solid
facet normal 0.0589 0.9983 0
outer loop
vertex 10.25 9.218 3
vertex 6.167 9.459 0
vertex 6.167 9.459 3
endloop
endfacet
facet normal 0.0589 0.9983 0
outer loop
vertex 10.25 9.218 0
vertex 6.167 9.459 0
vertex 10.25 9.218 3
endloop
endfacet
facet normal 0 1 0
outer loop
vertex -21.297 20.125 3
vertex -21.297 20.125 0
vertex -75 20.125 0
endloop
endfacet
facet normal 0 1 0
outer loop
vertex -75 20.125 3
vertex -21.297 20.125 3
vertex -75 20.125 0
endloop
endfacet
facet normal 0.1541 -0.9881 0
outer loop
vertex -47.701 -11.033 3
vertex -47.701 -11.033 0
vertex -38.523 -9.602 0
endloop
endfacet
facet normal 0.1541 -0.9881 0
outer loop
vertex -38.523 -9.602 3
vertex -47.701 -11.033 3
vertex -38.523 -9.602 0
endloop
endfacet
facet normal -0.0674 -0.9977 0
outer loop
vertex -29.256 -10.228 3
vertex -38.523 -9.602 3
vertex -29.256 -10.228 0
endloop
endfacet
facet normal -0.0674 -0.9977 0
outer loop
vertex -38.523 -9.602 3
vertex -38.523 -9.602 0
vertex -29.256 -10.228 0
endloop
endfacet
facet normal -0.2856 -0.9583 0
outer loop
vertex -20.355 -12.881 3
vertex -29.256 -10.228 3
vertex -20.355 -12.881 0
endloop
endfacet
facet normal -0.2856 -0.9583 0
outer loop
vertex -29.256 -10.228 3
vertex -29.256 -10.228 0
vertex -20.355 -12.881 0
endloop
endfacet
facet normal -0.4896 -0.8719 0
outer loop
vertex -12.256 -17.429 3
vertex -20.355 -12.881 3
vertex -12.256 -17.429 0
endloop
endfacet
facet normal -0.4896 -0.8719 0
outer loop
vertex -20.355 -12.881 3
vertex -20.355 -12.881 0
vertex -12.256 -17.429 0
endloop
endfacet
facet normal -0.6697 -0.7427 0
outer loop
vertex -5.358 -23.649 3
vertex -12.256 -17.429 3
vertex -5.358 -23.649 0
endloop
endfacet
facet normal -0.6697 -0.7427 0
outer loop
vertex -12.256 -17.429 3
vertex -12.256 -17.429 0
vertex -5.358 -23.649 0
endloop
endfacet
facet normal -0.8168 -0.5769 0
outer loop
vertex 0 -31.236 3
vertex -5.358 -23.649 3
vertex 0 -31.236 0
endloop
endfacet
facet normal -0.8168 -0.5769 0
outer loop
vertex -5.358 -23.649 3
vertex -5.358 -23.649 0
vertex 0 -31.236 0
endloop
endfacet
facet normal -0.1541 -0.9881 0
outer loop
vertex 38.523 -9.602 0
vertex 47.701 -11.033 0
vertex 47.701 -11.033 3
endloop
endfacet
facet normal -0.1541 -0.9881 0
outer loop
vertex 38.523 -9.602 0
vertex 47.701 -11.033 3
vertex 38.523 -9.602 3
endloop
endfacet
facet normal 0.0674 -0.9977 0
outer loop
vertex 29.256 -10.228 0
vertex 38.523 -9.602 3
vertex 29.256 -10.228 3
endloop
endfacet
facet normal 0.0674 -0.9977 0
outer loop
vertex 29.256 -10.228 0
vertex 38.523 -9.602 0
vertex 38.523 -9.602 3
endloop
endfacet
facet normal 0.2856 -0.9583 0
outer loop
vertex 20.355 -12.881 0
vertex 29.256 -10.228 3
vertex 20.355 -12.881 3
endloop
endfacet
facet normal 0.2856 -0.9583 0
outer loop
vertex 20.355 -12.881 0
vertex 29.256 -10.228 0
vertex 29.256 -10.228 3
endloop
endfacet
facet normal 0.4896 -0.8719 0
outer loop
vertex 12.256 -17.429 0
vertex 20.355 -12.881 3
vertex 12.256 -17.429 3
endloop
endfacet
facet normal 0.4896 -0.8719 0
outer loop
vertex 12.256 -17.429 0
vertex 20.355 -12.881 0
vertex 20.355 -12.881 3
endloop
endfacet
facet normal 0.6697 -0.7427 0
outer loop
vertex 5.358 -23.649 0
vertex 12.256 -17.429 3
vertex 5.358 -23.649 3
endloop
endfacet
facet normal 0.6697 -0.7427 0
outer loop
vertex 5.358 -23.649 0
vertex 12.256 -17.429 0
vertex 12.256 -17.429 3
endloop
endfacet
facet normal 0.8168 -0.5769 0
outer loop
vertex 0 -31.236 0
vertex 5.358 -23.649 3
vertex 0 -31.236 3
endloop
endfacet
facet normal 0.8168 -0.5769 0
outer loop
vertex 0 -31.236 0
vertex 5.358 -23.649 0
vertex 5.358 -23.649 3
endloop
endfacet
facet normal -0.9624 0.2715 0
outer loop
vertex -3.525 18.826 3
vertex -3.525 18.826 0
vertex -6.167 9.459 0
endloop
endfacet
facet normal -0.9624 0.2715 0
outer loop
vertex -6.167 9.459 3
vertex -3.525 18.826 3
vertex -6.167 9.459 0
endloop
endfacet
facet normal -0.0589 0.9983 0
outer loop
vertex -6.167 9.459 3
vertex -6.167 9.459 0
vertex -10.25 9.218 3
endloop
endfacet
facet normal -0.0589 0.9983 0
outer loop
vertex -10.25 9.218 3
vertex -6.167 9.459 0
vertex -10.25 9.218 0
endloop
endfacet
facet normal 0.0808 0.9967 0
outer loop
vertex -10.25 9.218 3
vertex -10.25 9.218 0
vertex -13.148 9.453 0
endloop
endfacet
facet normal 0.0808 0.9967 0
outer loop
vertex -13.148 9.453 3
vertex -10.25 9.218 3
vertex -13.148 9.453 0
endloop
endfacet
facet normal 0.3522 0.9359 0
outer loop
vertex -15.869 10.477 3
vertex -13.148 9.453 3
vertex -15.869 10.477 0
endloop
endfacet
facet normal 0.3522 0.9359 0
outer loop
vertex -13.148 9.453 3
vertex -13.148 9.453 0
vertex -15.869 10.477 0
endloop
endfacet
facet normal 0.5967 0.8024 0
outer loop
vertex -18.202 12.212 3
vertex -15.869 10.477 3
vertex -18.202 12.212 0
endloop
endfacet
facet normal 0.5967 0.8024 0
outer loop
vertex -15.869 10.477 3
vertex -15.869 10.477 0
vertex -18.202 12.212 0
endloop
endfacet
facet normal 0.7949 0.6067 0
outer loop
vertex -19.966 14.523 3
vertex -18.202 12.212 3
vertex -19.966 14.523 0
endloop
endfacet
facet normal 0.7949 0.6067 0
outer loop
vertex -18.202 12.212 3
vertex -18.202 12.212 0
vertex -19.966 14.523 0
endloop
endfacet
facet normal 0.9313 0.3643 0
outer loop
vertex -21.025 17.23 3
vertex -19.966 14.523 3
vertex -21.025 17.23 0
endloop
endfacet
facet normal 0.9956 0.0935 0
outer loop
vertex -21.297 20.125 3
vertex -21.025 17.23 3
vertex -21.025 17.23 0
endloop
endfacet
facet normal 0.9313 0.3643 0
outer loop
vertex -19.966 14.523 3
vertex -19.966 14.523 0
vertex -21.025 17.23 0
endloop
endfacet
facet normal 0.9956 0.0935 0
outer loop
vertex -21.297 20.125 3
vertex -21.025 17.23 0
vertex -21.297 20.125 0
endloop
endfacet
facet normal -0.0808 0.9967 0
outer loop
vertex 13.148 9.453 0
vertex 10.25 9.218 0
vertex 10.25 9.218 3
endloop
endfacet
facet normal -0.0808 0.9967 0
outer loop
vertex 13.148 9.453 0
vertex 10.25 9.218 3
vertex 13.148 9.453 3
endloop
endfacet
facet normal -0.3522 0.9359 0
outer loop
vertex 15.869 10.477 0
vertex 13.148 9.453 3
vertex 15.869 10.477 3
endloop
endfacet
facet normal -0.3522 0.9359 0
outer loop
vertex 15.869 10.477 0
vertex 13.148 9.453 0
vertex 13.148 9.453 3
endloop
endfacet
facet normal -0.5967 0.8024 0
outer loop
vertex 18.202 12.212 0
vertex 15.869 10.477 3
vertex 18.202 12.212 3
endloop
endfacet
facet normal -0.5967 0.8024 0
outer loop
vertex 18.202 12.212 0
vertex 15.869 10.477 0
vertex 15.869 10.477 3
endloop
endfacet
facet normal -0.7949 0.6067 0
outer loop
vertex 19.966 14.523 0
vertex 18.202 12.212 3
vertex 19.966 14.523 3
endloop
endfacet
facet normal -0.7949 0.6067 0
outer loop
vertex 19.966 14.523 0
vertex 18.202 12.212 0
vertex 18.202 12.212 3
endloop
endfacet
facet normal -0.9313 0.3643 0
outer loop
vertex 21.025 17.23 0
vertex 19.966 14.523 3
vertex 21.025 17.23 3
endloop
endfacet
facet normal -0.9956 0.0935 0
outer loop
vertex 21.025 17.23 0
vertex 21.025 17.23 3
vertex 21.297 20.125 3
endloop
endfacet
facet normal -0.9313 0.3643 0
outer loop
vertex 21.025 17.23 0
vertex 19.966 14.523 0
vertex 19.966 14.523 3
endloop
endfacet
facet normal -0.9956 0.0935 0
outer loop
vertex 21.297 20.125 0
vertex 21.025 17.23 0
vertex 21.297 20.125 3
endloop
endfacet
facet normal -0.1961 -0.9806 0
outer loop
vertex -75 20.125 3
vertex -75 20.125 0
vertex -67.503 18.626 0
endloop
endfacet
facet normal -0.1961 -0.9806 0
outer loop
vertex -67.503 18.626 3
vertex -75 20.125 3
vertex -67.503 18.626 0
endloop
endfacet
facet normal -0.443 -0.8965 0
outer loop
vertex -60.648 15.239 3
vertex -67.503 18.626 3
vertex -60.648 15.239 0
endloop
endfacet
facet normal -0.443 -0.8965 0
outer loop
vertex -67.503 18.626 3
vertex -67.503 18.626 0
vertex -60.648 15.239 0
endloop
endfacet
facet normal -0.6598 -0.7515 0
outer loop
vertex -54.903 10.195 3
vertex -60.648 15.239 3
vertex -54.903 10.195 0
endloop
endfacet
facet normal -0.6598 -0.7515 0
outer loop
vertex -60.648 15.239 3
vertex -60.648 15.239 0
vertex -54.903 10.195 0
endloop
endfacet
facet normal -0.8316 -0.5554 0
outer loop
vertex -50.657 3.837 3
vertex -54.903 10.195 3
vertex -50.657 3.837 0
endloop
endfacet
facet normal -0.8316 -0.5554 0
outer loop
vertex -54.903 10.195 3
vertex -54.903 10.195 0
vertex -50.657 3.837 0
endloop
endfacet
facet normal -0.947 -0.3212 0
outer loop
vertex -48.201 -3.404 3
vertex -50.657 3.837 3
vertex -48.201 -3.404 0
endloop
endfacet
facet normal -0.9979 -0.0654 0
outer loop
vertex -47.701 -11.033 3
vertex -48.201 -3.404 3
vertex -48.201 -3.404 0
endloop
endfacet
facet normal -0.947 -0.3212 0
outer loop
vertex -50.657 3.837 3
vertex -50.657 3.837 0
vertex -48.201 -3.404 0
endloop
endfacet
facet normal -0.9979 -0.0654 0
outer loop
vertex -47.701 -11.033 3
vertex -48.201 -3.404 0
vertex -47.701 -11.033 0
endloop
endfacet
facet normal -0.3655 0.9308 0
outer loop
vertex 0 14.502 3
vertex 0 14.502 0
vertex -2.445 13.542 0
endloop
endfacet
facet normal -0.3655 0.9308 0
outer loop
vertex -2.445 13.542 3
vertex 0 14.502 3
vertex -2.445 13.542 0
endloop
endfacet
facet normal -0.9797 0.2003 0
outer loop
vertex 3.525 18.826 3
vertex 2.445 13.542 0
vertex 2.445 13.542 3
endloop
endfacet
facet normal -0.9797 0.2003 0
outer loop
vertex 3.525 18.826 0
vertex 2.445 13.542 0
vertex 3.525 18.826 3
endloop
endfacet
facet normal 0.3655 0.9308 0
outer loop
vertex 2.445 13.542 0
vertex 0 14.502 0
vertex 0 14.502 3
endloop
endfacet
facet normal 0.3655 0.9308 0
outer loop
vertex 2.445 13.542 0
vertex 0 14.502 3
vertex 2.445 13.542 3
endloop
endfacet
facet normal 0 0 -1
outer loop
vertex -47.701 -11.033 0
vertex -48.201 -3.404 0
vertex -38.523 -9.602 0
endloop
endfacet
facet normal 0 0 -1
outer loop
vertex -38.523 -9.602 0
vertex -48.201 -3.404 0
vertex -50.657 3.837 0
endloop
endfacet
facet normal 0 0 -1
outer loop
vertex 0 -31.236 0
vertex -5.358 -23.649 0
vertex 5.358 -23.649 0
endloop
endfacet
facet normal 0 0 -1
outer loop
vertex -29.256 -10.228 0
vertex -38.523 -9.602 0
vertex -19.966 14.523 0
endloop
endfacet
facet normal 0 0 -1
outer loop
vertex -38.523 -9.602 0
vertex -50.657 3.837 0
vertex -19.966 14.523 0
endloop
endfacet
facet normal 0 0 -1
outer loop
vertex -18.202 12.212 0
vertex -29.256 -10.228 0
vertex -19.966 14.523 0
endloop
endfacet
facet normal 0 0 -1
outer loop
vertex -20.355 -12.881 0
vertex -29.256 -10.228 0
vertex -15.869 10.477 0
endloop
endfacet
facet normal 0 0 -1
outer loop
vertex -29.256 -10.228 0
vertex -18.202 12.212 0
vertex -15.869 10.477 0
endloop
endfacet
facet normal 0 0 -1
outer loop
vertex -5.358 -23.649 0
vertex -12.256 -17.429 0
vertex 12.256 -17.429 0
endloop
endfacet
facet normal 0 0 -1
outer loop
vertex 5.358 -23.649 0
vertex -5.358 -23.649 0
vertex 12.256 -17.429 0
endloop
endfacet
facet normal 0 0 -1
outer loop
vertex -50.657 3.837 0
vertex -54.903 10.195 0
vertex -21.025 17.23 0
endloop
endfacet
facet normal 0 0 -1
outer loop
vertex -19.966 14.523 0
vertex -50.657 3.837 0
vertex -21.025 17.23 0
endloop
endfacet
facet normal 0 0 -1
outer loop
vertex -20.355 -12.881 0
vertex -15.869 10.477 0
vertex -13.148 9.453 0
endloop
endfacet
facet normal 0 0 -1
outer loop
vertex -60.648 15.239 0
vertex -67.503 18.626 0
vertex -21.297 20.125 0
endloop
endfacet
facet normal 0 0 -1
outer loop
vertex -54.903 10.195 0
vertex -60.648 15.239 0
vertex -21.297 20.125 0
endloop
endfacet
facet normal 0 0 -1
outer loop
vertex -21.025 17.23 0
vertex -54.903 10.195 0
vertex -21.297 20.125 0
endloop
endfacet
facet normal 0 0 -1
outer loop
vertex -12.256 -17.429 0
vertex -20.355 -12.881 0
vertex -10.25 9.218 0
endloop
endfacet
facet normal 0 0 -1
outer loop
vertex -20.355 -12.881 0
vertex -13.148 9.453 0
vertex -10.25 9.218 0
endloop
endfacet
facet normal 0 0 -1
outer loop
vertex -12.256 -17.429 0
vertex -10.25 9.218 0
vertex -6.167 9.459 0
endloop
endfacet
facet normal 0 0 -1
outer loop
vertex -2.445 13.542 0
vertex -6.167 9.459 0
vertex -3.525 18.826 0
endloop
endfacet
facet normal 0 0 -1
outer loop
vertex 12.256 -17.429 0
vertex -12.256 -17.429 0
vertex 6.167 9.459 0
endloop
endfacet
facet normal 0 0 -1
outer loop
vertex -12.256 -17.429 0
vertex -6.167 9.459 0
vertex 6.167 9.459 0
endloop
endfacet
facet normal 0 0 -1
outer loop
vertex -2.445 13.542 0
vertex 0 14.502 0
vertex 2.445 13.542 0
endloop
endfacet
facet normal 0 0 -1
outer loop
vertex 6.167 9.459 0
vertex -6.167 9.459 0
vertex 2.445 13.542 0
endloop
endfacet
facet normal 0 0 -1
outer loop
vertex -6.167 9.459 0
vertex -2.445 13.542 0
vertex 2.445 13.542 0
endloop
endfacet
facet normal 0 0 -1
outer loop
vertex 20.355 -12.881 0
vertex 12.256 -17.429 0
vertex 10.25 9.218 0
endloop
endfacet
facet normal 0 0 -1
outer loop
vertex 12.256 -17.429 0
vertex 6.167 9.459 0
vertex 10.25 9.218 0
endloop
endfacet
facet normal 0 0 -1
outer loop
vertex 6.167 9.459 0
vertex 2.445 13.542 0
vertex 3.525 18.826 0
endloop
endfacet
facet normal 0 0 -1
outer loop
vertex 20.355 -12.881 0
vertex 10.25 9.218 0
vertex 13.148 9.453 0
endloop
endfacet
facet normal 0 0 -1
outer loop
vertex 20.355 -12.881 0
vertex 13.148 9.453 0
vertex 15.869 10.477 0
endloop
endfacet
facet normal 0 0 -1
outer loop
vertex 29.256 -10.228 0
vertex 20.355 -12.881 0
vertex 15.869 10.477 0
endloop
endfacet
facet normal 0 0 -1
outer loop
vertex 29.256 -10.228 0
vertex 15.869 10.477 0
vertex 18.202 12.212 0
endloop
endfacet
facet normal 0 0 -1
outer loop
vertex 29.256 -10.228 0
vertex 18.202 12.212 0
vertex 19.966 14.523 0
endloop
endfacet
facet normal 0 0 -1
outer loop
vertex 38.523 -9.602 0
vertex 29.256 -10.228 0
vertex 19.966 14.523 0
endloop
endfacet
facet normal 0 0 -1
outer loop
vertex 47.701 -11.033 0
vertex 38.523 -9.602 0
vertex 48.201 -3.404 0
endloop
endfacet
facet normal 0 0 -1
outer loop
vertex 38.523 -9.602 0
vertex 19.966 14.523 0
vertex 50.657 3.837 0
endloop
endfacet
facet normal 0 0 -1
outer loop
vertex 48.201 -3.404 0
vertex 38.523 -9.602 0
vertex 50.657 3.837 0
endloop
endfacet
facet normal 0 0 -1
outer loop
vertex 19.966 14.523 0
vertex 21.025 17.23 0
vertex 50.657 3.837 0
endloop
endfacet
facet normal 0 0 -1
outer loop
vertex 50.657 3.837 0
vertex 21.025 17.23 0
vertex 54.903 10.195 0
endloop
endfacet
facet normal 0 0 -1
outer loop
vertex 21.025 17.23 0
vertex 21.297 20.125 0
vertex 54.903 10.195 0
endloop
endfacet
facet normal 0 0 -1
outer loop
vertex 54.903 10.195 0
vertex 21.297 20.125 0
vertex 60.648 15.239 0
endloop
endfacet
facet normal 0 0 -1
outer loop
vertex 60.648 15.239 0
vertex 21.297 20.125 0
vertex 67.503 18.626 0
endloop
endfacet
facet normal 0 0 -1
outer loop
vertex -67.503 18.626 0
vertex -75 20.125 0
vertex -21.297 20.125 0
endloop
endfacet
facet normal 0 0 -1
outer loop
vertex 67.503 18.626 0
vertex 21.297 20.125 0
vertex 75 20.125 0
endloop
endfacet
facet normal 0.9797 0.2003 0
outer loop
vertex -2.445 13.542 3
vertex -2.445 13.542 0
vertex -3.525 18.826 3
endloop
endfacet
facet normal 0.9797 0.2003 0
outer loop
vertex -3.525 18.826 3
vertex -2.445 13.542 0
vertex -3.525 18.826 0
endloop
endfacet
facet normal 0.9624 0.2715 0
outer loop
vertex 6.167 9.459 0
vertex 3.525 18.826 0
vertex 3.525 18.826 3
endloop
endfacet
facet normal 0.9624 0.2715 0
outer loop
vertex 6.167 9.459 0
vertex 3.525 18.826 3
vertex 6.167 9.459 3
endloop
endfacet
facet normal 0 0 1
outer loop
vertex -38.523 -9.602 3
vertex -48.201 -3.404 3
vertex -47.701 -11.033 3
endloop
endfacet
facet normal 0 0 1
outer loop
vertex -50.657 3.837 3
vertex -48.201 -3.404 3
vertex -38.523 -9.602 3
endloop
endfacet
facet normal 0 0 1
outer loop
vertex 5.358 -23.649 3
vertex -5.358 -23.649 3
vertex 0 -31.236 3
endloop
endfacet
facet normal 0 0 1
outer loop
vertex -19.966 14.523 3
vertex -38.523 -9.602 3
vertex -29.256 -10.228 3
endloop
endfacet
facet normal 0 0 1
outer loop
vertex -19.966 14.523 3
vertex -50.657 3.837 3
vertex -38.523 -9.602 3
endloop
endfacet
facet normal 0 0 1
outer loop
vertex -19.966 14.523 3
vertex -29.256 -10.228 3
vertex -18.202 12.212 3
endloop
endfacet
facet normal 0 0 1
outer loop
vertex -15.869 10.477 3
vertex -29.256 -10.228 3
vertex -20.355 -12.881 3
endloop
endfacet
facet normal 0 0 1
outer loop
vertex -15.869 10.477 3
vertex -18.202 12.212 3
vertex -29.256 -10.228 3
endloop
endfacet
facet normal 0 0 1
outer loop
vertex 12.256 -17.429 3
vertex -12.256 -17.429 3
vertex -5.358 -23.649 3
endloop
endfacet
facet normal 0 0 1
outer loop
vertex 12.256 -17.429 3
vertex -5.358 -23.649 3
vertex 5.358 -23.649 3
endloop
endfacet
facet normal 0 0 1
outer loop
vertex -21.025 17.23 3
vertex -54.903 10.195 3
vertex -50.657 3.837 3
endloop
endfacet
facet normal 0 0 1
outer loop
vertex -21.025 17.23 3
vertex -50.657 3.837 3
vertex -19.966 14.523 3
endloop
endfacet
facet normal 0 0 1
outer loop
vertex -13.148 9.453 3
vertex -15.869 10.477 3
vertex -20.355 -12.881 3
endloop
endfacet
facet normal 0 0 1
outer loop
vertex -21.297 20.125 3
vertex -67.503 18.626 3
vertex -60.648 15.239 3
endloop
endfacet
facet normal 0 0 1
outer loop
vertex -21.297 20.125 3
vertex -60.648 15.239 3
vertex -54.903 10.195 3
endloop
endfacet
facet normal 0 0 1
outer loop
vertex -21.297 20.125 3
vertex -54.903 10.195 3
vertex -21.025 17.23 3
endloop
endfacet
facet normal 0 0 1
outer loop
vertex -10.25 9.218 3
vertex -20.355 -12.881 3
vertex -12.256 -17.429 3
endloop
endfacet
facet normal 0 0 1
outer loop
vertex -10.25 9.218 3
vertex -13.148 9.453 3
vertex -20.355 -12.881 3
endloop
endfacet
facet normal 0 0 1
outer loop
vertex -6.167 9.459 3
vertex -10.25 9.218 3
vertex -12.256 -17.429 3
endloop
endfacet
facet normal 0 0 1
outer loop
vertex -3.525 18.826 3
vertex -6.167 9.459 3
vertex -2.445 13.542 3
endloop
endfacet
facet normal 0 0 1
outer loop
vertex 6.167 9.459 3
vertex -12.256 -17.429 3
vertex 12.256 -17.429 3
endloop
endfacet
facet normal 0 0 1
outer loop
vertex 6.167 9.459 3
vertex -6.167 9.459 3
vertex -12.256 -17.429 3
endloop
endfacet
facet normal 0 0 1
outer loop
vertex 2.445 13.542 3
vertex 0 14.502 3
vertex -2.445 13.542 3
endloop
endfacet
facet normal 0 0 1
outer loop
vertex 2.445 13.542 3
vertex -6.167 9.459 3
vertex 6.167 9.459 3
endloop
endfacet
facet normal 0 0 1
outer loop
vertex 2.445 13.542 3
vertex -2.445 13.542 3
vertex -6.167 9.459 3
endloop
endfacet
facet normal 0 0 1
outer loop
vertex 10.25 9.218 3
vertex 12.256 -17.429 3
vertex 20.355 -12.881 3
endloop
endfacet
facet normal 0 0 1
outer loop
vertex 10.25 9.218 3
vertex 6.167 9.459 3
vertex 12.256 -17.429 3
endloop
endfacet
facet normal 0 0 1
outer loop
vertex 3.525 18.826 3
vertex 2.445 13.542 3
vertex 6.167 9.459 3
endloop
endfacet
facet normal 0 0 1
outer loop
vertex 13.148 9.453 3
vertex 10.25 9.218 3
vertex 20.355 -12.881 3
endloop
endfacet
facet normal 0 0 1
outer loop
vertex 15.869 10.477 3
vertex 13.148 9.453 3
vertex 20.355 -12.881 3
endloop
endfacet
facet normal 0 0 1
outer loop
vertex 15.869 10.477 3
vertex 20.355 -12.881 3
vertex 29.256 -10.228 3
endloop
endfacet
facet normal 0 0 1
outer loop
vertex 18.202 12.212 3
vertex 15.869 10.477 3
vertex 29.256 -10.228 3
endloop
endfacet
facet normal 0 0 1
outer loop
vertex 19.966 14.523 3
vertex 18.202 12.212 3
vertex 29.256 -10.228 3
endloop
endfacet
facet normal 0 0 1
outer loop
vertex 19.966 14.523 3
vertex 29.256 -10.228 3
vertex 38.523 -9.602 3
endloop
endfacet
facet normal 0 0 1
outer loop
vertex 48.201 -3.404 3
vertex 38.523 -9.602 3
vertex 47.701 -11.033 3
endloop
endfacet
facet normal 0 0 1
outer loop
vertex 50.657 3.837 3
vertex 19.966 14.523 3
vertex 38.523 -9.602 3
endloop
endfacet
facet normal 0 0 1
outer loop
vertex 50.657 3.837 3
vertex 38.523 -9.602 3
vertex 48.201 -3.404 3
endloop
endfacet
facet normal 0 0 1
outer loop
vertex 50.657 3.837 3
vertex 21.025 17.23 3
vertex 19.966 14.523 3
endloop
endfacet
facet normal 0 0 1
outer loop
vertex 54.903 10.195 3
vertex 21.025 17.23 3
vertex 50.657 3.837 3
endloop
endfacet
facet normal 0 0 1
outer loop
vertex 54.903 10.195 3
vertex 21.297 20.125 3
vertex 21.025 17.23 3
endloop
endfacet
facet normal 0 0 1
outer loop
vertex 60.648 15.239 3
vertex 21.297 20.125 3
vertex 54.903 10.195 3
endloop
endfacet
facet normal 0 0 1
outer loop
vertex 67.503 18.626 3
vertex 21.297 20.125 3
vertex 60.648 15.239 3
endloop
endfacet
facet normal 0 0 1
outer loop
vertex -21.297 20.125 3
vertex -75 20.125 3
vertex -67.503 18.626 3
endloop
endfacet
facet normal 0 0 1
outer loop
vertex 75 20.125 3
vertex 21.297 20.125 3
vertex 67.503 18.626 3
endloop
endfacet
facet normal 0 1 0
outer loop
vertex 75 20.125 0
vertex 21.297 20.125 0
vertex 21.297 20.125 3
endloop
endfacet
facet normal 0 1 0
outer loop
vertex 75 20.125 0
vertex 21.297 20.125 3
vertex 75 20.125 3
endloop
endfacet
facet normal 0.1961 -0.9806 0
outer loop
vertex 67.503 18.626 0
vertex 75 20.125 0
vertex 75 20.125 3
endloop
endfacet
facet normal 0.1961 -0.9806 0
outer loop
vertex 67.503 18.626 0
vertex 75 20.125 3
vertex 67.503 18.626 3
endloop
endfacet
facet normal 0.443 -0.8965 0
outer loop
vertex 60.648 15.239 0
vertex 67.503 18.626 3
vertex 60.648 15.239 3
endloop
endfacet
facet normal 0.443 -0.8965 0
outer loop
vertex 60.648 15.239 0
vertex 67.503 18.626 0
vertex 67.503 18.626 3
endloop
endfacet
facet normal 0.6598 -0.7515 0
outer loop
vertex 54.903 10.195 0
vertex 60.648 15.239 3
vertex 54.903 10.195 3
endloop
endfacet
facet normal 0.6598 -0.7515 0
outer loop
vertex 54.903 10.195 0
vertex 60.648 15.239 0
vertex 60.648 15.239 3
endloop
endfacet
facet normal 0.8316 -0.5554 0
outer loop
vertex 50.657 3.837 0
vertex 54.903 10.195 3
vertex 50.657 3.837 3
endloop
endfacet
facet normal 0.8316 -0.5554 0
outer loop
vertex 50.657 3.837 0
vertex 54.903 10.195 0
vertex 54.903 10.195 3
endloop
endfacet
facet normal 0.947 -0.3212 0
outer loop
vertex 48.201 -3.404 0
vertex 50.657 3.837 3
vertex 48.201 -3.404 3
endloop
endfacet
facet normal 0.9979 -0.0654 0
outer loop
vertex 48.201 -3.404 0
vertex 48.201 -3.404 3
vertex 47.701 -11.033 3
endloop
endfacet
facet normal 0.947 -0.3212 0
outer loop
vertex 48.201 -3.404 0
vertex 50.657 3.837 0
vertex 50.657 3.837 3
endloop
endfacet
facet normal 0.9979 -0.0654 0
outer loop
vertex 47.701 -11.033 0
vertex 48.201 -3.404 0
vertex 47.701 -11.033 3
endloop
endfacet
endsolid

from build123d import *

# Parameters (mm, degrees)
PAD_DEPTH = 3


with BuildPart() as part:
    # Sketch → Pad (new body)
    with BuildSketch(Plane.XY):
        with BuildLine():
            Line((0, 0), (0, 14.502488))
            Line((0, 14.502488), (2.444644, 13.541802))
            Line((2.444644, 13.541802), (3.525413, 18.825575))
            Line((3.525413, 18.825575), (6.167308, 9.459041))
            Line((6.167308, 9.459041), (10.250262, 9.218303))
            ThreePointArc((10.250262, 9.218303), (18.202038, 12.211905), (21.296978, 20.124789))
            Line((21.296978, 20.124789), (75, 20.124789))
            ThreePointArc((75, 20.124789), (54.90279, 10.195186), (47.700768, -11.032761))
            ThreePointArc((47.700768, -11.032761), (20.35465, -12.880568), (0, -31.235753))
            Line((0, -31.235753), (0, 0))
        make_face()
    pad = extrude(amount=PAD_DEPTH)

    # Mirrored: Pad across Sketch V_Axis
    add(pad.mirror(Plane(origin=(0, 0, 0), x_dir=(0, 0, 1), z_dir=(1, 0, 0))))


solid = part.part
